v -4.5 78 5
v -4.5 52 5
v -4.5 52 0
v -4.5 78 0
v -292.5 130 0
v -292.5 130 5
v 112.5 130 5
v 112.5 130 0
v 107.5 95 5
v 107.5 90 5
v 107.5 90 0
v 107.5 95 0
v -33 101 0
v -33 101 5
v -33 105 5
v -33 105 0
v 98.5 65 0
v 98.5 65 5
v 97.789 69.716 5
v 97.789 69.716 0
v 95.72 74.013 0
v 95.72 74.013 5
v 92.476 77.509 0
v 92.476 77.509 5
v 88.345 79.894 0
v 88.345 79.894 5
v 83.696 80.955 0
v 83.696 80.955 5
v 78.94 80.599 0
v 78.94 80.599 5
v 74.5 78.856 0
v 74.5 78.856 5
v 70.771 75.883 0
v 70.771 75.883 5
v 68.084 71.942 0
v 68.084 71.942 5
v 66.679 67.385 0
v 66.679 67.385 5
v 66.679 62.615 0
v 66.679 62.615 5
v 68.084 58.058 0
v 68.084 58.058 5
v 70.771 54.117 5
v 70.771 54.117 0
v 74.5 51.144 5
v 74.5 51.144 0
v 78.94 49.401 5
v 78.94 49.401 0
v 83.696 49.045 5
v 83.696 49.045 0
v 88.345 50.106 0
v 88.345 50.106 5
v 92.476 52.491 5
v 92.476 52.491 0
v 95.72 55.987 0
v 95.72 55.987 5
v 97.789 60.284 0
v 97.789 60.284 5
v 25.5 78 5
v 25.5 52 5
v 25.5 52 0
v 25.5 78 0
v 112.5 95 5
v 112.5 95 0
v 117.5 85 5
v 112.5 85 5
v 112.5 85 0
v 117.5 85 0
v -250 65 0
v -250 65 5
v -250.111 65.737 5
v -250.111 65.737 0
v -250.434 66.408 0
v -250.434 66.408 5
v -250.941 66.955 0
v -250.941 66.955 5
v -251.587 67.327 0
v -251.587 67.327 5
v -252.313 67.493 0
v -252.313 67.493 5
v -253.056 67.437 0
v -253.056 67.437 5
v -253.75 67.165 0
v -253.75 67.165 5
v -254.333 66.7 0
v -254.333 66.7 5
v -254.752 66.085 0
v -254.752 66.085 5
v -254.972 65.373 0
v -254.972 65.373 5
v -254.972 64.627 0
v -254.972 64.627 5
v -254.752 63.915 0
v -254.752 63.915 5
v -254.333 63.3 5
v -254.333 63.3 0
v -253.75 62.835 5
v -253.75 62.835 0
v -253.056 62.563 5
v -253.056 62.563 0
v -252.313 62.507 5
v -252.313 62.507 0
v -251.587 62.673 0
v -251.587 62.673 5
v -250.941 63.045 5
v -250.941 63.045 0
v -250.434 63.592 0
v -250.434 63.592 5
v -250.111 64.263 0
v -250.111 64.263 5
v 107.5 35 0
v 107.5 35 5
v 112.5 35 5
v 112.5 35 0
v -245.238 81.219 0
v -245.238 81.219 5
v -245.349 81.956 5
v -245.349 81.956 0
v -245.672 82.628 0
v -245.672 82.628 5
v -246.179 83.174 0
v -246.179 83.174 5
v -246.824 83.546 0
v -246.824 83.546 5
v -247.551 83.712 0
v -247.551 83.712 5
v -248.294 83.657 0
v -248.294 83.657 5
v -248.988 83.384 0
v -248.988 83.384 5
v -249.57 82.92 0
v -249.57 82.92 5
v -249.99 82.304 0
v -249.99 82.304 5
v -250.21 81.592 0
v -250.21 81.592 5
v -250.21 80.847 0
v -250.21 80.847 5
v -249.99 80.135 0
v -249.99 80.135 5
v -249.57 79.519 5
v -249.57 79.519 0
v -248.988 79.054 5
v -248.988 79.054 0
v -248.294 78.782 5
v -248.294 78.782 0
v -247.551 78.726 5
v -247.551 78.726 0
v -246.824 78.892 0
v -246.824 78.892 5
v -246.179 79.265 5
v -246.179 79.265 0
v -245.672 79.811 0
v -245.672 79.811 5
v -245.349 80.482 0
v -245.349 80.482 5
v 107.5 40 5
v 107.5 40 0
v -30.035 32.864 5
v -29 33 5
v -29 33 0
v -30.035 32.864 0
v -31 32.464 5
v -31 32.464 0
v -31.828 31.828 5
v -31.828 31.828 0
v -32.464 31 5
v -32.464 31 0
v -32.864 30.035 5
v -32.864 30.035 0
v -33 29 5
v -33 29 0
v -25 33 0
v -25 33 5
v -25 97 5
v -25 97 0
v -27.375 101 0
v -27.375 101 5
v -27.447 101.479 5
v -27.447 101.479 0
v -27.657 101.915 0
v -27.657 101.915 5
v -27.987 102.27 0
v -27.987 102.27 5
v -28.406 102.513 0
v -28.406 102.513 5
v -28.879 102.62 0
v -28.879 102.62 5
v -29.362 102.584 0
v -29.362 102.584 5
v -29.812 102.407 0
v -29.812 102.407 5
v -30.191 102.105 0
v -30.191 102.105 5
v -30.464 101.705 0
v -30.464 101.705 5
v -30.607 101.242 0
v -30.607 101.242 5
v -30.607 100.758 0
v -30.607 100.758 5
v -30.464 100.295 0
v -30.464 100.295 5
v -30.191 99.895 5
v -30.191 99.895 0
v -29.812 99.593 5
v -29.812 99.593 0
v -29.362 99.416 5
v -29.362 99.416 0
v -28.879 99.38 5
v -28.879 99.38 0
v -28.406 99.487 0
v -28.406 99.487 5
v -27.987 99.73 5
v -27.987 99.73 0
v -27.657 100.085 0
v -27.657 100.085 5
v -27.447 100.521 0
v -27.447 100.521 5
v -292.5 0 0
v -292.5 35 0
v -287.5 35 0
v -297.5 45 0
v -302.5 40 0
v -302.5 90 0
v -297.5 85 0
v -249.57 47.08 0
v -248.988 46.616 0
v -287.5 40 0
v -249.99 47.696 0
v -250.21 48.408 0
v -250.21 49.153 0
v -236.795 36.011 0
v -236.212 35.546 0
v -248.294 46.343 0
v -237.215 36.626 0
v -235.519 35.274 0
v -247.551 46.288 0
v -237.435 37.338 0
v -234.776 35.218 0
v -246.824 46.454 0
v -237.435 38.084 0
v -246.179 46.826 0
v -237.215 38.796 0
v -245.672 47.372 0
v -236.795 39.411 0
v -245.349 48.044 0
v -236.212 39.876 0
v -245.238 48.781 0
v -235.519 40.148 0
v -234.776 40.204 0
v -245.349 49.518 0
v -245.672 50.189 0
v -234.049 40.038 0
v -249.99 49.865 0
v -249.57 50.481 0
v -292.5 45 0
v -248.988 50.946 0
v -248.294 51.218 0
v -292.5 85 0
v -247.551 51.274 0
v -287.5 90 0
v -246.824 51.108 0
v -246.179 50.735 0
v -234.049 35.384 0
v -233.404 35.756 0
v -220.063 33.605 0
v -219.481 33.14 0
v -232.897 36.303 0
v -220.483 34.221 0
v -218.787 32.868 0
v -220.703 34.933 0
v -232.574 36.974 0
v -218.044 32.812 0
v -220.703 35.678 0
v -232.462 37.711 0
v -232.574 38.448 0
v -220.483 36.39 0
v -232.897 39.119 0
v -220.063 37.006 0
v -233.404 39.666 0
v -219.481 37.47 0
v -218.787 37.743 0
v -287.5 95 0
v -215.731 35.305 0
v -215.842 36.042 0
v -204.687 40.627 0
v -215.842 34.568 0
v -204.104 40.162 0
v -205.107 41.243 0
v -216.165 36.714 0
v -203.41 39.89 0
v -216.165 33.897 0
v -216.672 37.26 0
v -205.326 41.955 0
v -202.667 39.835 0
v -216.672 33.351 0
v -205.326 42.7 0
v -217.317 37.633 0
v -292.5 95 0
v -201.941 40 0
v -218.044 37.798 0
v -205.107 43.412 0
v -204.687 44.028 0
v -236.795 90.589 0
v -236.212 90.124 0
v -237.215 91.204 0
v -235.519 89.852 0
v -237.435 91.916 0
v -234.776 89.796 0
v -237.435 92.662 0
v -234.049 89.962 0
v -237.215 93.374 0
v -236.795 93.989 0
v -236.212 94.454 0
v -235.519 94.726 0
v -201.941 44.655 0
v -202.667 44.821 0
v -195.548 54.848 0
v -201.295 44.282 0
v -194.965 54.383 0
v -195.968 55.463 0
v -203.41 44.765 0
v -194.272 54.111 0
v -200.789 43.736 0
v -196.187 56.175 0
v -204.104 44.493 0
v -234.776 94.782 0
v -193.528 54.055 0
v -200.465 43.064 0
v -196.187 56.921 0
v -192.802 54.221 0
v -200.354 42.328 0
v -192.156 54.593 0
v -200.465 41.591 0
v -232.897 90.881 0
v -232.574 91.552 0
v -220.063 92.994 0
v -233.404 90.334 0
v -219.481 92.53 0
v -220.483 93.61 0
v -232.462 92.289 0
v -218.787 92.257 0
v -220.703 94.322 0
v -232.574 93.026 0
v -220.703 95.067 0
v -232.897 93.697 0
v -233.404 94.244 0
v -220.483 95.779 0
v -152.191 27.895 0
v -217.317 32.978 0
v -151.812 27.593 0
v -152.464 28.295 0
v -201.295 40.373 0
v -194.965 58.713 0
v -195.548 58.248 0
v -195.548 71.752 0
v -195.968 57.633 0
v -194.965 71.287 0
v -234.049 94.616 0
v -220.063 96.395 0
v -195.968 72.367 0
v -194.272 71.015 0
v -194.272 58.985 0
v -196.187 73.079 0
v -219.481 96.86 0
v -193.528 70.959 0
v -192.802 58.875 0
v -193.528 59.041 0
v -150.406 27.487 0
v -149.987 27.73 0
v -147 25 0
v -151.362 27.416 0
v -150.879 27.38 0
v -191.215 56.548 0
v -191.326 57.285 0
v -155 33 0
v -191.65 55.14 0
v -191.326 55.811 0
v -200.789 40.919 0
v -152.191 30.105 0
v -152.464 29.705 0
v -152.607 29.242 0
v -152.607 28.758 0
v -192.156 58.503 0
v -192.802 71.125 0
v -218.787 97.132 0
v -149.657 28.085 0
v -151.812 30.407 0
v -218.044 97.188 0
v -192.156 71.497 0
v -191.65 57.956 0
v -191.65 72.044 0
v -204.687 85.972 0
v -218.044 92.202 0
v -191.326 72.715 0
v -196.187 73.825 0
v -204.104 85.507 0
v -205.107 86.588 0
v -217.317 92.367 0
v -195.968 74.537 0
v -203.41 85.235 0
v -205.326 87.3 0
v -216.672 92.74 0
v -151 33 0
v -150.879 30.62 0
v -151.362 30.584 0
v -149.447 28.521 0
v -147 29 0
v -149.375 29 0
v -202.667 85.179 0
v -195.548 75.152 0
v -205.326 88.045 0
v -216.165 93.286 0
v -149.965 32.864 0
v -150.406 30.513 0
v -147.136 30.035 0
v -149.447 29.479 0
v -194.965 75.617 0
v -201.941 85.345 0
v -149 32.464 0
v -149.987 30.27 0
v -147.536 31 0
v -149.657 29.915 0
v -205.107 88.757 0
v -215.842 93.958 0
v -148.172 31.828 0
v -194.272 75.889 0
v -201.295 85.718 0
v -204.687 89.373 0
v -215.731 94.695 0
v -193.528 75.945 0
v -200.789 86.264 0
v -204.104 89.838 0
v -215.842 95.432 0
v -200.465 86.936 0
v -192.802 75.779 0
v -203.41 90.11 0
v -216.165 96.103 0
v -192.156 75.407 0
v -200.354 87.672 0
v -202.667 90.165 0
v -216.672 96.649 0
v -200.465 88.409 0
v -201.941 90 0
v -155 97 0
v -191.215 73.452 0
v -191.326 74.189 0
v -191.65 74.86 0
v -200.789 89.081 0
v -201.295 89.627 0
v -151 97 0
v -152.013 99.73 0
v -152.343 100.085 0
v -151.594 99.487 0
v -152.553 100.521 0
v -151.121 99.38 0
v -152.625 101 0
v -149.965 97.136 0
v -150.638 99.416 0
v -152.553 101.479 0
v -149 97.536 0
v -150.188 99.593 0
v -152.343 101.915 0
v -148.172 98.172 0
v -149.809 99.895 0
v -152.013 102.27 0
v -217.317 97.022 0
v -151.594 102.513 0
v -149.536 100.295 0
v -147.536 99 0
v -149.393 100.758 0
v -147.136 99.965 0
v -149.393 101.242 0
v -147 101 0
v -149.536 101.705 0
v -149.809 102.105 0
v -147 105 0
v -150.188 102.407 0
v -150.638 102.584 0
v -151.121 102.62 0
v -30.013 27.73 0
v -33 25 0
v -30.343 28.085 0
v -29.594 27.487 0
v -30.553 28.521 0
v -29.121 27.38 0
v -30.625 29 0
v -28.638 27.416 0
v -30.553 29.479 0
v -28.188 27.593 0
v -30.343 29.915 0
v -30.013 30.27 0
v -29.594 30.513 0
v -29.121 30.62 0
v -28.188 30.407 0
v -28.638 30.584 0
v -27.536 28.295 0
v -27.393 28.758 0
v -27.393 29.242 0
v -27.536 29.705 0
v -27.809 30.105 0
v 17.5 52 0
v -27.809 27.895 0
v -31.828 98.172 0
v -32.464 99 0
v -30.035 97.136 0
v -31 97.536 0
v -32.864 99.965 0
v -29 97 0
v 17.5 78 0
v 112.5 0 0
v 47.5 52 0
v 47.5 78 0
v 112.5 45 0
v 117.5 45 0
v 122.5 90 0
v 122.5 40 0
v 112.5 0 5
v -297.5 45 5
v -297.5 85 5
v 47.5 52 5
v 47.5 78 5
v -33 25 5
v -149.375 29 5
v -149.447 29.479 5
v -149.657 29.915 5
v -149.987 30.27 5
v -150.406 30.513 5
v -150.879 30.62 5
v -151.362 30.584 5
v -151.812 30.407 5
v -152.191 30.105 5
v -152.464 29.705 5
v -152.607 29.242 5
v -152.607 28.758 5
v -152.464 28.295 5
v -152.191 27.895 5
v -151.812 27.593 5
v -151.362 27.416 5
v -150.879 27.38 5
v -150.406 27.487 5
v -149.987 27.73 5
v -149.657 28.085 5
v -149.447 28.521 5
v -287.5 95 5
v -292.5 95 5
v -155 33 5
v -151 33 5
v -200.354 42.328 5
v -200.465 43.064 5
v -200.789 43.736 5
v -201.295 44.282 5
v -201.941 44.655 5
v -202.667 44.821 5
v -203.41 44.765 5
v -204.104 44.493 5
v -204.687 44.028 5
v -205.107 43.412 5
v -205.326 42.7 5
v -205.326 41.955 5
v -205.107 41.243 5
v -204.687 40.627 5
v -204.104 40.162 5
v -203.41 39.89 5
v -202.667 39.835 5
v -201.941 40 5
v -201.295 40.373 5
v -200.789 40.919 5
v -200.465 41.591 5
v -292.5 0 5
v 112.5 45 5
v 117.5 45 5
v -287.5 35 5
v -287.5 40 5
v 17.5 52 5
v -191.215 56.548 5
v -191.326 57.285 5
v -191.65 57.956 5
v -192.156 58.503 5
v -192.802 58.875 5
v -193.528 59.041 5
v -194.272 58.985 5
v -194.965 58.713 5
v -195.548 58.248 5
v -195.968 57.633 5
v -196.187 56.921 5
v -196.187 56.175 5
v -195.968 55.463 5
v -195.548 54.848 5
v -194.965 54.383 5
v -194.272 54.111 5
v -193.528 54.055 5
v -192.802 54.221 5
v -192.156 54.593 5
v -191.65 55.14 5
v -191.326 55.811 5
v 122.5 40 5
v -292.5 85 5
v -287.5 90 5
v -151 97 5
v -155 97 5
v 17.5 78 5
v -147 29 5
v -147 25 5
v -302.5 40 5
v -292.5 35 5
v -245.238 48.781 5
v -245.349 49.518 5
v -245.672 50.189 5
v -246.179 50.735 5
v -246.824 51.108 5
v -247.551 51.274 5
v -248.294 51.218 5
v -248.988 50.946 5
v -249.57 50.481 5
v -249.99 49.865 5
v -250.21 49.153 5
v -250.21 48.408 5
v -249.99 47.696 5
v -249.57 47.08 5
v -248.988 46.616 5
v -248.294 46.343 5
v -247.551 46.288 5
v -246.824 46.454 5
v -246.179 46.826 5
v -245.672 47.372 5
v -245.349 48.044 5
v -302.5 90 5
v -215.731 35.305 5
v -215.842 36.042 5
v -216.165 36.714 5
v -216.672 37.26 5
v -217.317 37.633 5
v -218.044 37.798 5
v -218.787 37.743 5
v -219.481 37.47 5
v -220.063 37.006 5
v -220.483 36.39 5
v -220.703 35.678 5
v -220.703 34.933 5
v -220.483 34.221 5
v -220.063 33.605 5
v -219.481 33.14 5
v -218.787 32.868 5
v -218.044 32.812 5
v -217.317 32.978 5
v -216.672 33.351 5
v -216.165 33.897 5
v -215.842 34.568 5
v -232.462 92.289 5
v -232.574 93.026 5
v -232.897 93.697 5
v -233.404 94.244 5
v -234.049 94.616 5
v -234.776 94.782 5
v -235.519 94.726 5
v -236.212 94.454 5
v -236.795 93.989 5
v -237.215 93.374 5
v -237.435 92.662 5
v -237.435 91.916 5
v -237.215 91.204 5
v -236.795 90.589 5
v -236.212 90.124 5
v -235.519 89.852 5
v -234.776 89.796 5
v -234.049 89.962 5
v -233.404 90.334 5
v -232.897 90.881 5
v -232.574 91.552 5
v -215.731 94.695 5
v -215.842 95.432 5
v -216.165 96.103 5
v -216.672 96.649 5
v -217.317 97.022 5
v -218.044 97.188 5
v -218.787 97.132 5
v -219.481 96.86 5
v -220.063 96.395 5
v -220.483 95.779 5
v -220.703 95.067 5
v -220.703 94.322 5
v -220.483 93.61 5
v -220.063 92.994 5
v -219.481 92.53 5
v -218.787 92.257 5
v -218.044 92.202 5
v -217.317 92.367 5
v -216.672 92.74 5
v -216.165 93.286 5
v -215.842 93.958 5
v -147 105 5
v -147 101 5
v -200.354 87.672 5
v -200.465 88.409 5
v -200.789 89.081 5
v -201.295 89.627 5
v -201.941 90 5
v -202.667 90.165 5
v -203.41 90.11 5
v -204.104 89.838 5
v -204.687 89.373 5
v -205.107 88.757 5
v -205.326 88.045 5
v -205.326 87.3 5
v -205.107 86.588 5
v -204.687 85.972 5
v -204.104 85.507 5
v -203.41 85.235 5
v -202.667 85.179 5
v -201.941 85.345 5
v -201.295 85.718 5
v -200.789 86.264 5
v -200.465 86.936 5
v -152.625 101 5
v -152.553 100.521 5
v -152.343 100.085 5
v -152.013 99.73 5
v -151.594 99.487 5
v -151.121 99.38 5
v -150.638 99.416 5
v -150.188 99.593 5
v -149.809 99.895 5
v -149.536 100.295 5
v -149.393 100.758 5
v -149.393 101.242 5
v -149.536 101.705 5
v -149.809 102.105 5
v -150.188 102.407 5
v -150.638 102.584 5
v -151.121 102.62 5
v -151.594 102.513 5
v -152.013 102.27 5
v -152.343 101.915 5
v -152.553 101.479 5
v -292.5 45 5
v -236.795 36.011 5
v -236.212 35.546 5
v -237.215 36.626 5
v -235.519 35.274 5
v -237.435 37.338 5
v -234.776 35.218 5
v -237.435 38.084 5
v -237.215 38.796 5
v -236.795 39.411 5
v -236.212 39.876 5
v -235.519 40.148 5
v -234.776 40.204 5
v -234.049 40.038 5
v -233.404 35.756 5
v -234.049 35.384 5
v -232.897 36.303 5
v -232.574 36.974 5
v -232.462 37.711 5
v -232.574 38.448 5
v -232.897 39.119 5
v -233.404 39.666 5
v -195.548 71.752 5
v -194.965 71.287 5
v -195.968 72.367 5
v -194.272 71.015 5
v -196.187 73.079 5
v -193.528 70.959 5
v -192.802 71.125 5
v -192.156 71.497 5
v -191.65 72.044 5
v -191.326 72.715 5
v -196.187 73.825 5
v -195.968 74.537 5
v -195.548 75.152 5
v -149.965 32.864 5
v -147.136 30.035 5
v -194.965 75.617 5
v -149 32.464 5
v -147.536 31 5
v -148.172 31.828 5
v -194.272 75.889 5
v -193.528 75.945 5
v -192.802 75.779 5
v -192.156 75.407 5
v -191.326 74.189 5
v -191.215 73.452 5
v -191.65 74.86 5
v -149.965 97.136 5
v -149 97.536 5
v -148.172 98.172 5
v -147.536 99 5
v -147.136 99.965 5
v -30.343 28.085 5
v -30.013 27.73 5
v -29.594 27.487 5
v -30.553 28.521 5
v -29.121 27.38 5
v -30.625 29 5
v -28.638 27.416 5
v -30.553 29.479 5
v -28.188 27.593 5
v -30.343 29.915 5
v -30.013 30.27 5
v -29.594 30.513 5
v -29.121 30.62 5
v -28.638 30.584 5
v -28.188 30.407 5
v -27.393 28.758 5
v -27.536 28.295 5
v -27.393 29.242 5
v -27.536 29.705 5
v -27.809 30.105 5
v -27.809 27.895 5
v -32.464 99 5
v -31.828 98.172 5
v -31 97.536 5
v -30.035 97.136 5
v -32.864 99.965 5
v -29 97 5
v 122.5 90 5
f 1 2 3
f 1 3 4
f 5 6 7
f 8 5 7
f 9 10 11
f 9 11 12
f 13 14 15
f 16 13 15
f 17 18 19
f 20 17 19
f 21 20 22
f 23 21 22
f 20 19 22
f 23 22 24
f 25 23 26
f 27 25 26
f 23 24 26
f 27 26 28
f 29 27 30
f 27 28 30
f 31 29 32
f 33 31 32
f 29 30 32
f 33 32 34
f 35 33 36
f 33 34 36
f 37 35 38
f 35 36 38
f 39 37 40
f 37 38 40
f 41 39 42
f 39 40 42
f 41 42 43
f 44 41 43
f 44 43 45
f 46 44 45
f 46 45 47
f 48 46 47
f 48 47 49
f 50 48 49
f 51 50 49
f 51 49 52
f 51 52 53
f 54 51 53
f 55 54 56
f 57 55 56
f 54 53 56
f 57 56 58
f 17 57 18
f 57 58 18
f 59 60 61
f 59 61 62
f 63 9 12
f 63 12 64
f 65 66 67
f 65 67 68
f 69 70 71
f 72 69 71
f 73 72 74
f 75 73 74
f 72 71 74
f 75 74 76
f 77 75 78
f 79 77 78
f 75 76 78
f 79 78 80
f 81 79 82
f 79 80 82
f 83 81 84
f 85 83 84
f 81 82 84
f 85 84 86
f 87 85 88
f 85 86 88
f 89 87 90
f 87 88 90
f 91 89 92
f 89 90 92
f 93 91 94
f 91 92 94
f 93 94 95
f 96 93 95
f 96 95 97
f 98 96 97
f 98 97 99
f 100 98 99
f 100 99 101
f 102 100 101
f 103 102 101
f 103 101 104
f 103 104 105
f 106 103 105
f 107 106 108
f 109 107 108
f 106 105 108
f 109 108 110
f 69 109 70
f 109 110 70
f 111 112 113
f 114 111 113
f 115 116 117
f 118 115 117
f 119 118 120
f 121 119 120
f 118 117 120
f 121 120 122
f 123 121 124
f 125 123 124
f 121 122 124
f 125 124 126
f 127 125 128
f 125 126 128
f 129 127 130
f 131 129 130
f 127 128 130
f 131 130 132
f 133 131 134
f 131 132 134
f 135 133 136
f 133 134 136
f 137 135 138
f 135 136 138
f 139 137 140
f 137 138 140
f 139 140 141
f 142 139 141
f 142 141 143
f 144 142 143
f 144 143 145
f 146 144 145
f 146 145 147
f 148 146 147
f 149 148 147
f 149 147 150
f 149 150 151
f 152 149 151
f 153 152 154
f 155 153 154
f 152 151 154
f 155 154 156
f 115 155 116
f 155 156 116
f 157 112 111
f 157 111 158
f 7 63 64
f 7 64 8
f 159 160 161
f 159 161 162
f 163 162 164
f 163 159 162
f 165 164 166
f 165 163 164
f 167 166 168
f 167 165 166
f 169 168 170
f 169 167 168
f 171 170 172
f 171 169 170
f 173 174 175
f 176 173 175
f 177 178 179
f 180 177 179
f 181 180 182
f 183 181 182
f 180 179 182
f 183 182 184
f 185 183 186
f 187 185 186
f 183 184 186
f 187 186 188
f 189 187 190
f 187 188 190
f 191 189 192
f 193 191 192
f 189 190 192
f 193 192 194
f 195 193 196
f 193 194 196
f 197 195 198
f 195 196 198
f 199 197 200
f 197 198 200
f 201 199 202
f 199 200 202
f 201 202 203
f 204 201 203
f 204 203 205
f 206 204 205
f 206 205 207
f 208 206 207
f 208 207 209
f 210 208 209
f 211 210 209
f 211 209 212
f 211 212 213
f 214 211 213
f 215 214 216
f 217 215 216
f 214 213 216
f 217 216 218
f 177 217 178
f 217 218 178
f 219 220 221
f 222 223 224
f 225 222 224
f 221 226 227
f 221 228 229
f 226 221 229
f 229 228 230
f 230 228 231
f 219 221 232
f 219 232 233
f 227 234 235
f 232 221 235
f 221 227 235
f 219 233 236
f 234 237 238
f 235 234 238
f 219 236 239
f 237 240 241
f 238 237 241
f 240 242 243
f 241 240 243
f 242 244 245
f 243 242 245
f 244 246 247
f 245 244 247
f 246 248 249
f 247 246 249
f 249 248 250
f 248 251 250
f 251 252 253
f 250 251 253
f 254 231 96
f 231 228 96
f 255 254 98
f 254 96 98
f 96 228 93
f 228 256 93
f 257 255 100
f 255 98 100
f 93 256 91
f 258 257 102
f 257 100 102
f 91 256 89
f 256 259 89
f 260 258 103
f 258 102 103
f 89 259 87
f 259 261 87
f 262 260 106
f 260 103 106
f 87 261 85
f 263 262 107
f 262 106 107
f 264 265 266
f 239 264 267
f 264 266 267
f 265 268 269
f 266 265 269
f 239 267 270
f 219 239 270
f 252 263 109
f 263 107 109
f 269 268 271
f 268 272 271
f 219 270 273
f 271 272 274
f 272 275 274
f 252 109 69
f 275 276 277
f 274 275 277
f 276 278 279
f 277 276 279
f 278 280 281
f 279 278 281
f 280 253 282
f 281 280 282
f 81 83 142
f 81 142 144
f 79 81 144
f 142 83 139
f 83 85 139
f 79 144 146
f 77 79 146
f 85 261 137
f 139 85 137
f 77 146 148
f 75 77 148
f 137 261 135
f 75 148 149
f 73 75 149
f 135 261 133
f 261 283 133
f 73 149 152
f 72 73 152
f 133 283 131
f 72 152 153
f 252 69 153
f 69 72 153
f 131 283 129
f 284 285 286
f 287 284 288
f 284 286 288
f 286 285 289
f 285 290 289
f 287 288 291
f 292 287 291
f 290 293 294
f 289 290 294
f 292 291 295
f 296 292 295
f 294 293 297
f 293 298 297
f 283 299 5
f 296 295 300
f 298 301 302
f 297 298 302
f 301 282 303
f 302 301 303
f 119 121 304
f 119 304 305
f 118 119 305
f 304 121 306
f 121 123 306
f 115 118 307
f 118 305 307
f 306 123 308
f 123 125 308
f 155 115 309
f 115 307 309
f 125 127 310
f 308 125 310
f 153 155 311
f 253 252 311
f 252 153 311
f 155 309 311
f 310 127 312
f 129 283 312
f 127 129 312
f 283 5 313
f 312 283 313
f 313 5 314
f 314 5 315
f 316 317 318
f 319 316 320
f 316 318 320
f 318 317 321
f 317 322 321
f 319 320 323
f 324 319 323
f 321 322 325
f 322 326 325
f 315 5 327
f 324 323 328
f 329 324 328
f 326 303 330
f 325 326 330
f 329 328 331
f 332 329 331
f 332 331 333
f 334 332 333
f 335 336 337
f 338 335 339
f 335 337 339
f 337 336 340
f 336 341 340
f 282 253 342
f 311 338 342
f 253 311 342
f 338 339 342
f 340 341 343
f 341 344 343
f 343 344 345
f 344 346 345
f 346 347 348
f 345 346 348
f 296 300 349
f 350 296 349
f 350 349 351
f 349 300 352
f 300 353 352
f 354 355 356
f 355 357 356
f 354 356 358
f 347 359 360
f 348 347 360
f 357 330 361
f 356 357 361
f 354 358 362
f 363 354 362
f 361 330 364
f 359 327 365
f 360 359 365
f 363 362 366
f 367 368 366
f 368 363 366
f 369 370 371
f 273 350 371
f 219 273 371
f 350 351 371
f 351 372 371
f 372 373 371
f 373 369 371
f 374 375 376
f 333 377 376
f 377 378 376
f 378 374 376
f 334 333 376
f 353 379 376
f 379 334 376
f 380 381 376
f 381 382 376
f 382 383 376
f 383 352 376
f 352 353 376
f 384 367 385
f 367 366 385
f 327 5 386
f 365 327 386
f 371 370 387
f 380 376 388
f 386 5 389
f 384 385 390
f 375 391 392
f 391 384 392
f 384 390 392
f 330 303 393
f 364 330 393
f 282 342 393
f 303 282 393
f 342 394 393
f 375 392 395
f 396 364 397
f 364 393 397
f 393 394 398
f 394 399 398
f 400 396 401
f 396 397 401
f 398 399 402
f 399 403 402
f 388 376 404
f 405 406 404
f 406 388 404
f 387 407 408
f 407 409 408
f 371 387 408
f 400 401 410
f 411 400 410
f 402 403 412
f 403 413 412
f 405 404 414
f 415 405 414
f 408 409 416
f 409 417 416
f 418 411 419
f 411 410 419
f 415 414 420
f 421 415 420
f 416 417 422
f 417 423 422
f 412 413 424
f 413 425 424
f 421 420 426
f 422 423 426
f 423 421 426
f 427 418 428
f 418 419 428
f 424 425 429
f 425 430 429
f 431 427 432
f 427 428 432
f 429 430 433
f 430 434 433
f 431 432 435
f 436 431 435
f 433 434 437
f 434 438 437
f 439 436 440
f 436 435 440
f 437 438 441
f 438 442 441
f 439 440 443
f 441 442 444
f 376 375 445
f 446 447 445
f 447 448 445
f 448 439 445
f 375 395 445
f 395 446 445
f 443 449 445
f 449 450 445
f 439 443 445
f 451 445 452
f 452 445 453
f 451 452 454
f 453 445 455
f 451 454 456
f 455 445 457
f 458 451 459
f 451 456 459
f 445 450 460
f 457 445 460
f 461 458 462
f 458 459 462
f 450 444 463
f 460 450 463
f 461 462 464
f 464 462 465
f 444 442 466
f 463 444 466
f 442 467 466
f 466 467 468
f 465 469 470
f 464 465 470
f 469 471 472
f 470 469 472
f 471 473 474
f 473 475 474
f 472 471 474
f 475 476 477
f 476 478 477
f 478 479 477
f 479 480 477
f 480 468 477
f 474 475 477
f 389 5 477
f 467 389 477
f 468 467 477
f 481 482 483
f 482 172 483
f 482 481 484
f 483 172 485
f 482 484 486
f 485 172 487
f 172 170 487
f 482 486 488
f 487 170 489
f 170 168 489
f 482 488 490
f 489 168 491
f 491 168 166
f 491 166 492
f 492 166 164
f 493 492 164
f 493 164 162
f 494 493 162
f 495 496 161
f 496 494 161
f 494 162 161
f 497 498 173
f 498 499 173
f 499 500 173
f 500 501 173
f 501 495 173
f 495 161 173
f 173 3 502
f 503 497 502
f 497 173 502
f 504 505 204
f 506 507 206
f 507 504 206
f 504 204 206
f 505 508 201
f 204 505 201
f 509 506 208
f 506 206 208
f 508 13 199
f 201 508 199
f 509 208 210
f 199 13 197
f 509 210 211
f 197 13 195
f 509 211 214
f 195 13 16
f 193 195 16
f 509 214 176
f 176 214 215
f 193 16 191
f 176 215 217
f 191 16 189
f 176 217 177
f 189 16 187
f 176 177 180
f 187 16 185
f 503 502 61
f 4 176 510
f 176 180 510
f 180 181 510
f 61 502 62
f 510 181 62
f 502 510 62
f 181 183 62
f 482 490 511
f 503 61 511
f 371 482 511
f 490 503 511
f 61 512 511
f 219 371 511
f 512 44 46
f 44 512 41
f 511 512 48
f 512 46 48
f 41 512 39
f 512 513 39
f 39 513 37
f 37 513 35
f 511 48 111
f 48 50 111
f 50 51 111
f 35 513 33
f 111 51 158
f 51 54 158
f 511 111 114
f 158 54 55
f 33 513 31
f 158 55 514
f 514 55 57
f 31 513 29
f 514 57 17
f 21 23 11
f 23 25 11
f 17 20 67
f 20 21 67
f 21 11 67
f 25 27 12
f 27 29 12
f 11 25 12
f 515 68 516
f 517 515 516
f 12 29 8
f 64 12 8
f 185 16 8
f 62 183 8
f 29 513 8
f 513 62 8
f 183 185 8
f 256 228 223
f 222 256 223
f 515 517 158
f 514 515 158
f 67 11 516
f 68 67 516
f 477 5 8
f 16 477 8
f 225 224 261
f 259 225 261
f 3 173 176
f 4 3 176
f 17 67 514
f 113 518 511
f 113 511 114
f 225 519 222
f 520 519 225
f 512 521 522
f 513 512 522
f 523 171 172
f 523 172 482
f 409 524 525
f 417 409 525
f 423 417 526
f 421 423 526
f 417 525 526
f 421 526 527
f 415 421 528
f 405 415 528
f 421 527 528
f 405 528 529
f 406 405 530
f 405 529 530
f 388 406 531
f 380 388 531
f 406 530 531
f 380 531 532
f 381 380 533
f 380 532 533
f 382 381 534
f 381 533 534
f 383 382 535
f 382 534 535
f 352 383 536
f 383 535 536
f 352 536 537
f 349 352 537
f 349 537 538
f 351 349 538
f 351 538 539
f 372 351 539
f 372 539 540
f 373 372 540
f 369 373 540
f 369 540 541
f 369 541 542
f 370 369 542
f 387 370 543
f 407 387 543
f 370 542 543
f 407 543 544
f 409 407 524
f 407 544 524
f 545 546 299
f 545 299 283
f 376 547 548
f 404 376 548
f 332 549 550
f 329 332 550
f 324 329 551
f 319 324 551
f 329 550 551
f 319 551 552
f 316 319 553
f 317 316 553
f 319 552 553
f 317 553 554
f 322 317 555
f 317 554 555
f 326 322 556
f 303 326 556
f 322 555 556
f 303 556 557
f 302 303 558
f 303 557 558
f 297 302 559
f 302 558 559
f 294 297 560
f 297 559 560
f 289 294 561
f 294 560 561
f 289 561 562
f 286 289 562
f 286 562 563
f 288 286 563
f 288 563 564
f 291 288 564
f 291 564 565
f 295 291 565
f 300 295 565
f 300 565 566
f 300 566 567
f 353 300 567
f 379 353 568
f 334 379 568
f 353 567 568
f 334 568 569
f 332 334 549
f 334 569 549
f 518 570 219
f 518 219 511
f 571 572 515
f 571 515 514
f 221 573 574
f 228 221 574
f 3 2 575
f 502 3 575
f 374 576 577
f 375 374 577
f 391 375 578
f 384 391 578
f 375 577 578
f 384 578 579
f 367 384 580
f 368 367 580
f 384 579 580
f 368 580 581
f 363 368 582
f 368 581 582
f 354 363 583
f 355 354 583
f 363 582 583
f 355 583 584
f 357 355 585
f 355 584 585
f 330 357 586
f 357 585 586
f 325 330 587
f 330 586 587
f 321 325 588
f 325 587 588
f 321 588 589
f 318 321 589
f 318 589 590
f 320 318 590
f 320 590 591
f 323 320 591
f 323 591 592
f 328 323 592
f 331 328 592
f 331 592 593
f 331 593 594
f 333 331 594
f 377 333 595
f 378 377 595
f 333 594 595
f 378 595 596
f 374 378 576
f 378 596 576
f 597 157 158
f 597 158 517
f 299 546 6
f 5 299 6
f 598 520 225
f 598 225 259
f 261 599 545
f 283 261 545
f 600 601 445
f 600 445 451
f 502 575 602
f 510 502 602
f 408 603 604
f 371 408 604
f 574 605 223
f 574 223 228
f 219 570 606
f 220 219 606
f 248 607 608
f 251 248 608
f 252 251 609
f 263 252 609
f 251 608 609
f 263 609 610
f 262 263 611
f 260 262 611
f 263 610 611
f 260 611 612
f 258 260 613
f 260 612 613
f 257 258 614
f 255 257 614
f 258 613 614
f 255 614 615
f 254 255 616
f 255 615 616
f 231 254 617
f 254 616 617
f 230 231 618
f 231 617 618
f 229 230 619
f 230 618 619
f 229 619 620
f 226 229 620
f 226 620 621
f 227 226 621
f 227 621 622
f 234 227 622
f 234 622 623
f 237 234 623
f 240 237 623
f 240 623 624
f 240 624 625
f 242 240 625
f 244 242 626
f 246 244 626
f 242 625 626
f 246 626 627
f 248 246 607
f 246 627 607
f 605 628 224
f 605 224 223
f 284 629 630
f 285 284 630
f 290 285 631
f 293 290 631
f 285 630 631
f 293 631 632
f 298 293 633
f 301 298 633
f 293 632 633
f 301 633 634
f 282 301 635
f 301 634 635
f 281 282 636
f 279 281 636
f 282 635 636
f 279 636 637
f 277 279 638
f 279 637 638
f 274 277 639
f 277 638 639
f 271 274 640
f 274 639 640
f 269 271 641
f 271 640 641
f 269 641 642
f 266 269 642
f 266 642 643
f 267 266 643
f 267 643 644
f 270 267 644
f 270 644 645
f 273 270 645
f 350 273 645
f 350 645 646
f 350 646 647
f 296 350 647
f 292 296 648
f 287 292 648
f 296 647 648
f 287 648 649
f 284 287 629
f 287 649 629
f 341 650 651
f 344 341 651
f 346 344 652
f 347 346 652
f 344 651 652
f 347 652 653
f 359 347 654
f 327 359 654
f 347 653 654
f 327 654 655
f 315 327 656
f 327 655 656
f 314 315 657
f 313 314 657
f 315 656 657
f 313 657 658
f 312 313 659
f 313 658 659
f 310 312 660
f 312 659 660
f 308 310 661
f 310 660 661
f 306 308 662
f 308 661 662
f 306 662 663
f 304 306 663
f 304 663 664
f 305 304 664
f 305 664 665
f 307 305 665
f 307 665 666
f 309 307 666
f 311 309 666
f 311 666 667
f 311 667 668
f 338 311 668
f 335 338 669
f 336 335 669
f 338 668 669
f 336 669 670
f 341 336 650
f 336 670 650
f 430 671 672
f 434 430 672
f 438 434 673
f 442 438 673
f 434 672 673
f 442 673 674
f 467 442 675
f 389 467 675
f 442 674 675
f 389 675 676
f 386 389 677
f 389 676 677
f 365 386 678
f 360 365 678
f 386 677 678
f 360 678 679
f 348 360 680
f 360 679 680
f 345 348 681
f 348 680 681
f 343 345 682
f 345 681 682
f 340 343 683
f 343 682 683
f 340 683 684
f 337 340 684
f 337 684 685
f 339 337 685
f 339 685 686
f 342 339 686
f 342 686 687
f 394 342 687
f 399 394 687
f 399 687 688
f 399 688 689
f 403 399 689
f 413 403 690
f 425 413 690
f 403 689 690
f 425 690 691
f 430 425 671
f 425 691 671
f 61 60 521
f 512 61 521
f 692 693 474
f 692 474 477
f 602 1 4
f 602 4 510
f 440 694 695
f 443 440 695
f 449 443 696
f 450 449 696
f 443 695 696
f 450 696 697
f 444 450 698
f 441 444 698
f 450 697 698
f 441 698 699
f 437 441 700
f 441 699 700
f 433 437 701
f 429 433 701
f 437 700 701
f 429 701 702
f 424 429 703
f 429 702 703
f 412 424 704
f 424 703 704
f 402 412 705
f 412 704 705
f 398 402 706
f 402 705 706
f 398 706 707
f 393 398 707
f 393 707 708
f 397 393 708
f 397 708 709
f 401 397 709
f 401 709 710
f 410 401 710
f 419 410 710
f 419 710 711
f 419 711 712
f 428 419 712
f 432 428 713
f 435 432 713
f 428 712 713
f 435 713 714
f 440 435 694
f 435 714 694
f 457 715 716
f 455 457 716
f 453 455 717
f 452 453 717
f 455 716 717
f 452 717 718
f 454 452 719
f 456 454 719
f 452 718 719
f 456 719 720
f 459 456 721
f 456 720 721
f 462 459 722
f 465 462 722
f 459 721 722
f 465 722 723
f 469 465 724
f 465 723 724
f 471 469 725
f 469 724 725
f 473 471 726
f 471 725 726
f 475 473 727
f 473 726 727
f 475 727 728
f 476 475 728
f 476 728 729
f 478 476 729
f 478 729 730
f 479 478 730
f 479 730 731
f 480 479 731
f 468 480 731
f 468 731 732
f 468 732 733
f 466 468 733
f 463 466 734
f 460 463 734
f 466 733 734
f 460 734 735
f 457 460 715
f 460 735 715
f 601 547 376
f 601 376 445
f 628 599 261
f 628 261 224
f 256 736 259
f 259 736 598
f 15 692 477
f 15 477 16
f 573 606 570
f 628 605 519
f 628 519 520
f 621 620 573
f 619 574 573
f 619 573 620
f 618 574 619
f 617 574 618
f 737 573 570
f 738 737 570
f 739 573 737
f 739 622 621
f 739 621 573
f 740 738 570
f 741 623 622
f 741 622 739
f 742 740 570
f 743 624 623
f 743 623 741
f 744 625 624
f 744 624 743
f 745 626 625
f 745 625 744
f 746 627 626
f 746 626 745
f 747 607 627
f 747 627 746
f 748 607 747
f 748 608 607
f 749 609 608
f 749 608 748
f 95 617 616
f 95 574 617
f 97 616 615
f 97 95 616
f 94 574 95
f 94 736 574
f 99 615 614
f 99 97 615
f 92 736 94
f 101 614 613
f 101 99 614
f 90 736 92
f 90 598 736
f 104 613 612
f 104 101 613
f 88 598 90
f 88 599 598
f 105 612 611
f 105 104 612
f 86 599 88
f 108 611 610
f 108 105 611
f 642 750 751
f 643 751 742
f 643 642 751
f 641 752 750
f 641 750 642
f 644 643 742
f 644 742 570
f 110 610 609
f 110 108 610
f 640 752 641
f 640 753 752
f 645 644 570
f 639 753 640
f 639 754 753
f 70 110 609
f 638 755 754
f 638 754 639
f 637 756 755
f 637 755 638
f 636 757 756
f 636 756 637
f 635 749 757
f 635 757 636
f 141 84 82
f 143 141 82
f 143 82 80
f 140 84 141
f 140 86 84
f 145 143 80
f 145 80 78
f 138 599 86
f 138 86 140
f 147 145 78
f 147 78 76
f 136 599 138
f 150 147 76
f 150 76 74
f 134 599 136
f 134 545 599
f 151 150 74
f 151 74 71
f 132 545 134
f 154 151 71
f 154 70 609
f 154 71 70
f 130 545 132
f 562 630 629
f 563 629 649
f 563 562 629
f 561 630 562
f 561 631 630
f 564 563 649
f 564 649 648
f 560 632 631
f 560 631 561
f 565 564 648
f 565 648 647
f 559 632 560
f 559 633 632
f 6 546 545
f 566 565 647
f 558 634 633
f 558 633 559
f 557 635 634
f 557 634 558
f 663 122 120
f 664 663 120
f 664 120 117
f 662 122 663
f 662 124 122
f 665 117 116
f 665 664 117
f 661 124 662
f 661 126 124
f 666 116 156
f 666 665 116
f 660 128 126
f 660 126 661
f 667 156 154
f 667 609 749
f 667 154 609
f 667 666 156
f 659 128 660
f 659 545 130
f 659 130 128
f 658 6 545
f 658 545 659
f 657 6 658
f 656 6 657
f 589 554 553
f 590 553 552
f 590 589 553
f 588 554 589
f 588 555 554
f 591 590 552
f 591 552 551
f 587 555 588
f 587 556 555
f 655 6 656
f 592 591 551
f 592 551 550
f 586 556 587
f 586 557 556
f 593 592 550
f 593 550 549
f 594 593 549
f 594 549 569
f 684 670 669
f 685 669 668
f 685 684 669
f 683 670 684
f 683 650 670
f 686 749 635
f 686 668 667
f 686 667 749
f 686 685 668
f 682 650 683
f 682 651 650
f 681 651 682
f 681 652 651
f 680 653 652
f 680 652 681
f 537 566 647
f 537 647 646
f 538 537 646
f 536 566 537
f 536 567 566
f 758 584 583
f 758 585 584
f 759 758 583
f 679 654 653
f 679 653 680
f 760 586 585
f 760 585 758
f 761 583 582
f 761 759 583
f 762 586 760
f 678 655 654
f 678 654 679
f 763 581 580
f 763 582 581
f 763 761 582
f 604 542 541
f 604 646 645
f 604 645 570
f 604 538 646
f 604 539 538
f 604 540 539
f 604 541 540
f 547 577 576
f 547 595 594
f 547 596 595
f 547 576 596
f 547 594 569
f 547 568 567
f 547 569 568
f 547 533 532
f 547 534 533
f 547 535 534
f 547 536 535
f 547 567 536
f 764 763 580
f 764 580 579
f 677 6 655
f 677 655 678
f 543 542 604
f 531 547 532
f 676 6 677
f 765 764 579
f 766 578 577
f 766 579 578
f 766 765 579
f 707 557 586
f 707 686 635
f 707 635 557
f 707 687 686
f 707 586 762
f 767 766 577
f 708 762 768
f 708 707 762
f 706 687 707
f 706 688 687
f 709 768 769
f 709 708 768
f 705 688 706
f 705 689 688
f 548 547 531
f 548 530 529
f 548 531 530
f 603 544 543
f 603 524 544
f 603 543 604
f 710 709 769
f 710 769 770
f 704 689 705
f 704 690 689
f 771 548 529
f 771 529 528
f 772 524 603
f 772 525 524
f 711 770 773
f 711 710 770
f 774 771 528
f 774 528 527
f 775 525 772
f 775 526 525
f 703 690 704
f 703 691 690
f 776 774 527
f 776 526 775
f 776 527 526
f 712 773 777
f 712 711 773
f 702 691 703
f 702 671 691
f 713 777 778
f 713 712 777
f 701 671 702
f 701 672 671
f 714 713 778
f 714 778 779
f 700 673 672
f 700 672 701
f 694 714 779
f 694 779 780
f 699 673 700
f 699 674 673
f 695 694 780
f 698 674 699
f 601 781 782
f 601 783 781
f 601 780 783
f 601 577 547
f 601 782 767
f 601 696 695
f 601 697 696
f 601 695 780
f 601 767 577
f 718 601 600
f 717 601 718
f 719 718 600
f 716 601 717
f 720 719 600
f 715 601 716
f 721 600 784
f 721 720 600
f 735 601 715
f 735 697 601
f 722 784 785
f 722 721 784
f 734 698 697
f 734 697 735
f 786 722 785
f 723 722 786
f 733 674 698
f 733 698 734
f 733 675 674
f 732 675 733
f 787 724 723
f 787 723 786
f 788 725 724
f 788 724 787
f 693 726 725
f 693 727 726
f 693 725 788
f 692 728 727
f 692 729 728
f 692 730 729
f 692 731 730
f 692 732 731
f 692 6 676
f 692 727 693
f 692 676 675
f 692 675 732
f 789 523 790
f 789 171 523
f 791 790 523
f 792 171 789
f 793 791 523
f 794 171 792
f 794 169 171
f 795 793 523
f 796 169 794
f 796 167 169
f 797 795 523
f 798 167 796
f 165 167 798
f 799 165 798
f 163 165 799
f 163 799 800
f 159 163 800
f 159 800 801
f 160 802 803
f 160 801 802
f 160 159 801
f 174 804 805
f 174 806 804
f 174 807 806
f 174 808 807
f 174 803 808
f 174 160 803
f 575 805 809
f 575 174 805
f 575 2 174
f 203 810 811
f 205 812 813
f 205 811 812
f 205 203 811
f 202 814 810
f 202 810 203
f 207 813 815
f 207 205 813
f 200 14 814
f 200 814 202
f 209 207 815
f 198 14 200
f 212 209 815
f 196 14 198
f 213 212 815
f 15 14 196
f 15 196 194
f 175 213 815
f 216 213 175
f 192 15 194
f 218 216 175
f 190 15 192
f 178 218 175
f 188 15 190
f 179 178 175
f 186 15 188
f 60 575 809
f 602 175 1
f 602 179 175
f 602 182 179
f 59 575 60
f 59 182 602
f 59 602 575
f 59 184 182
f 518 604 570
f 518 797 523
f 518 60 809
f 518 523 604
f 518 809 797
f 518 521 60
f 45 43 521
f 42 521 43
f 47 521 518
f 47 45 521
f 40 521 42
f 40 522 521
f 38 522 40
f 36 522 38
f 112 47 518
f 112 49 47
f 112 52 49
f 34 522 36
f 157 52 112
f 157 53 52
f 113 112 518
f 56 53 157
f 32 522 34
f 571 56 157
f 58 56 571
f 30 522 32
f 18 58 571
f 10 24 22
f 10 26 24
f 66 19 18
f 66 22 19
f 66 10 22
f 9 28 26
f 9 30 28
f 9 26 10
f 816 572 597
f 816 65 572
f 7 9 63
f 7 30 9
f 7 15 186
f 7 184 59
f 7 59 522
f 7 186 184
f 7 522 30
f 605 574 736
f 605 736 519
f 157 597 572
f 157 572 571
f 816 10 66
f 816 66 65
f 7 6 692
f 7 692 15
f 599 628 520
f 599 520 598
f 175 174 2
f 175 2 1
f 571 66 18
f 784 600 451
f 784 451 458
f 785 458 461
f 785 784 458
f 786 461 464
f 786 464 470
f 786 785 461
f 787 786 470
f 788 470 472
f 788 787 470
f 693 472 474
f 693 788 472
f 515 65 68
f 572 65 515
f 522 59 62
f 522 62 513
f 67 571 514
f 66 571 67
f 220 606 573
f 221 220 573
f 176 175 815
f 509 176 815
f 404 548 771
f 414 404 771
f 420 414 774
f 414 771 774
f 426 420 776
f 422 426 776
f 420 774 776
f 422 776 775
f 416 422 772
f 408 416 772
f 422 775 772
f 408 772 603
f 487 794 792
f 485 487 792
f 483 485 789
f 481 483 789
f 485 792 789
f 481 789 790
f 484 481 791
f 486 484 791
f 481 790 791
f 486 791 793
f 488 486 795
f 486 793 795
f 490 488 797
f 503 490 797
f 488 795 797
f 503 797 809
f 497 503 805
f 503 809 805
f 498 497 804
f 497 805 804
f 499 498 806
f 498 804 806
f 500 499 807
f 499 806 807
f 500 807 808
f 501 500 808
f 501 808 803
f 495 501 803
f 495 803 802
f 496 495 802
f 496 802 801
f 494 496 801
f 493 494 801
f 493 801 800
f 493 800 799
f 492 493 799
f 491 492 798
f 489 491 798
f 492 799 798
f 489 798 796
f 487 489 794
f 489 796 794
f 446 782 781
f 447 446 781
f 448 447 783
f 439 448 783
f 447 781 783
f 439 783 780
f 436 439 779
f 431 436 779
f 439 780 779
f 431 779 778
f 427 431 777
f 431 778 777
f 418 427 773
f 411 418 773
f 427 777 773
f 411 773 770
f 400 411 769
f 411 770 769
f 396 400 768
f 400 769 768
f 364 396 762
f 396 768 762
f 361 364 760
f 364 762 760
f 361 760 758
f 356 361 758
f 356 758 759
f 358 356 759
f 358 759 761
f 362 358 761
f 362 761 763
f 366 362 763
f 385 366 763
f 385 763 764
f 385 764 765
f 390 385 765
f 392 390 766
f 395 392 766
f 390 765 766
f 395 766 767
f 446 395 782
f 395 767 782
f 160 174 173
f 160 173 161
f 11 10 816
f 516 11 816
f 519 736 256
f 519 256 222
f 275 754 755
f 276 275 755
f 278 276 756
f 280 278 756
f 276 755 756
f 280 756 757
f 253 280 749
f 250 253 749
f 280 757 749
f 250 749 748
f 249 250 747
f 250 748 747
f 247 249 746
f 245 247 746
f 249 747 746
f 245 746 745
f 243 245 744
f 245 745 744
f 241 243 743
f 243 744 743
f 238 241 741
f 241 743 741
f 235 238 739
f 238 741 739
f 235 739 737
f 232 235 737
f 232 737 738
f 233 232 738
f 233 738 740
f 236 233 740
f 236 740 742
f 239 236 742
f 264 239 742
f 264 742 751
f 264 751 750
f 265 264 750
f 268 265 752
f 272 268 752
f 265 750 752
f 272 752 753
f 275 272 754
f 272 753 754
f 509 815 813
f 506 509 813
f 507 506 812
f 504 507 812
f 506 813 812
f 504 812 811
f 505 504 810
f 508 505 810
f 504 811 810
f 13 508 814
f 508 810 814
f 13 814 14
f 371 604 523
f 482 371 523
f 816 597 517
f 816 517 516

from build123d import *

# Parameters (mm, degrees)
SKETCH1_W           = 180
SKETCH1_H           = 130
BOSS_EXTRUDE1_DEPTH = 5
SKETCH2_W           = 130
SKETCH2_H           = 80
CUT_EXTRUDE1_DEPTH  = 10
SKETCH5_R           = 1.625
BOSS_EXTRUDE3_DEPTH = 5
SKETCH6_W           = 112.5
SKETCH6_H           = 130
BOSS_EXTRUDE4_DEPTH = 5
SKETCH7_W           = 5
SKETCH7_H           = 5
CUT_EXTRUDE2_DEPTH  = 5
BOSS_EXTRUDE5_DEPTH = 5
SKETCH9_R           = 2.5
CUT_EXTRUDE3_DEPTH  = 5
SKETCH10_R          = 16
SKETCH10_W          = 22
SKETCH10_H          = 26
CUT_EXTRUDE4_DEPTH  = 5


with BuildPart() as part:
    # Sketch1 → Boss-Extrude1 (new body)
    with BuildSketch(Plane.XY):
        with Locations((-90, 65)):
            Rectangle(SKETCH1_W, SKETCH1_H)
    extrude(amount=BOSS_EXTRUDE1_DEPTH)

    # Sketch2 → Cut-Extrude1 (cut)
    with BuildSketch(Plane.XY.offset(5)):
        with Locations((-90, 65)):
            Rectangle(SKETCH2_W, SKETCH2_H)
    extrude(amount=-CUT_EXTRUDE1_DEPTH, mode=Mode.SUBTRACT)

    # Sketch5 → Boss-Extrude3 (add)
    # profile 1 of 4: a face of its own
    with BuildSketch(Plane.XY.offset(5)):
        with BuildLine():
            Line((-33, 101), (-33, 105))
            Line((-33, 105), (-25, 105))
            Line((-25, 105), (-25, 97))
            Line((-25, 97), (-29, 97))
            ThreePointArc((-29, 97), (-31.828427125, 98.171572875), (-33, 101))
        make_face()
        with Locations((-29, 101)):
            Circle(SKETCH5_R, mode=Mode.SUBTRACT)
    # profile 2 of 4: a face of its own
    with BuildSketch(Plane.XY.offset(5)):
        with BuildLine():
            Line((-155, 97), (-151, 97))
            ThreePointArc((-151, 97), (-148.171572875, 98.171572875), (-147, 101))
            Line((-147, 101), (-147, 105))
            Line((-147, 105), (-155, 105))
            Line((-155, 105), (-155, 97))
        make_face()
        with Locations(Location((-151, 101, 0), (0, 0, 180))):
            Circle(SKETCH5_R, mode=Mode.SUBTRACT)
    # profile 3 of 4: a face of its own
    with BuildSketch(Plane.XY.offset(5)):
        with BuildLine():
            Line((-25, 33), (-29, 33))
            ThreePointArc((-29, 33), (-31.828427125, 31.828427125), (-33, 29))
            Line((-33, 29), (-33, 25))
            Line((-33, 25), (-25, 25))
            Line((-25, 25), (-25, 33))
        make_face()
        with Locations(Location((-29, 29, 0), (0, 0, 180))):
            Circle(SKETCH5_R, mode=Mode.SUBTRACT)
    # profile 4 of 4: a face of its own
    with BuildSketch(Plane.XY.offset(5)):
        with BuildLine():
            Line((-147, 29), (-147, 25))
            Line((-147, 25), (-155, 25))
            Line((-155, 25), (-155, 33))
            Line((-155, 33), (-151, 33))
            ThreePointArc((-151, 33), (-148.171572875, 31.828427125), (-147, 29))
        make_face()
        with Locations((-151, 29)):
            Circle(SKETCH5_R, mode=Mode.SUBTRACT)
    extrude(amount=-BOSS_EXTRUDE3_DEPTH)

    # Sketch6 → Boss-Extrude4 (add)
    with BuildSketch(Plane.XY.offset(5)):
        with Locations((-236.25, 65)):
            Rectangle(SKETCH6_W, SKETCH6_H)
        with Locations((56.25, 65)):
            Rectangle(SKETCH6_W, SKETCH6_H)
    extrude(amount=-BOSS_EXTRUDE4_DEPTH)

    # Sketch7 → Cut-Extrude2 (cut)
    with BuildSketch(Plane.XY.offset(5)):
        with Locations((-290, 37.5)):
            Rectangle(SKETCH7_W, SKETCH7_H)
        with Locations((-290, 92.5)):
            Rectangle(SKETCH7_W, SKETCH7_H)
        with Locations((110, 92.5)):
            Rectangle(SKETCH7_W, SKETCH7_H)
        with Locations((110, 37.5)):
            Rectangle(SKETCH7_W, SKETCH7_H)
    extrude(amount=-CUT_EXTRUDE2_DEPTH, mode=Mode.SUBTRACT)

    # Sketch8 → Boss-Extrude5 (add)
    with BuildSketch(Plane.XY.offset(5)):
        Polygon((-302.5, 40), (-292.5, 40), (-292.5, 45), (-297.5, 45), (-297.5, 85), (-292.5, 85), (-292.5, 90), (-302.5, 90), align=None)
        Polygon((117.5, 85), (117.5, 45), (112.5, 45), (112.5, 40), (122.5, 40), (122.5, 90), (112.5, 90), (112.5, 85), align=None)
    extrude(amount=-BOSS_EXTRUDE5_DEPTH)

    # Sketch9 → Cut-Extrude3 (cut)
    with BuildSketch(Plane.XY.offset(5)):
        with Locations((-252.5, 65)):
            Circle(SKETCH9_R)
        with Locations((-247.737605985, 81.219224524)):
            Circle(SKETCH9_R)
        with Locations((-234.96245039, 92.288959861)):
            Circle(SKETCH9_R)
        with Locations((-218.230554852, 94.694643256)):
            Circle(SKETCH9_R)
        with Locations((-202.854177982, 87.672487231)):
            Circle(SKETCH9_R)
        with Locations((-193.715210792, 73.451976705)):
            Circle(SKETCH9_R)
        with Locations((-193.715210792, 56.548023295)):
            Circle(SKETCH9_R)
        with Locations((-202.854177982, 42.327512769)):
            Circle(SKETCH9_R)
        with Locations((-218.230554852, 35.305356744)):
            Circle(SKETCH9_R)
        with Locations((-234.96245039, 37.711040139)):
            Circle(SKETCH9_R)
        with Locations((-247.737605985, 48.780775476)):
            Circle(SKETCH9_R)
    extrude(amount=-CUT_EXTRUDE3_DEPTH, mode=Mode.SUBTRACT)

    # Sketch10 → Cut-Extrude4 (cut)
    with BuildSketch(Plane.XY.offset(5)):
        with Locations((82.5, 65)):
            Circle(SKETCH10_R)
        with Locations((6.5, 65)):
            Rectangle(SKETCH10_W, SKETCH10_H)
        with Locations((36.5, 65)):
            Rectangle(SKETCH10_W, SKETCH10_H)
    extrude(amount=-CUT_EXTRUDE4_DEPTH, mode=Mode.SUBTRACT)


solid = part.part
